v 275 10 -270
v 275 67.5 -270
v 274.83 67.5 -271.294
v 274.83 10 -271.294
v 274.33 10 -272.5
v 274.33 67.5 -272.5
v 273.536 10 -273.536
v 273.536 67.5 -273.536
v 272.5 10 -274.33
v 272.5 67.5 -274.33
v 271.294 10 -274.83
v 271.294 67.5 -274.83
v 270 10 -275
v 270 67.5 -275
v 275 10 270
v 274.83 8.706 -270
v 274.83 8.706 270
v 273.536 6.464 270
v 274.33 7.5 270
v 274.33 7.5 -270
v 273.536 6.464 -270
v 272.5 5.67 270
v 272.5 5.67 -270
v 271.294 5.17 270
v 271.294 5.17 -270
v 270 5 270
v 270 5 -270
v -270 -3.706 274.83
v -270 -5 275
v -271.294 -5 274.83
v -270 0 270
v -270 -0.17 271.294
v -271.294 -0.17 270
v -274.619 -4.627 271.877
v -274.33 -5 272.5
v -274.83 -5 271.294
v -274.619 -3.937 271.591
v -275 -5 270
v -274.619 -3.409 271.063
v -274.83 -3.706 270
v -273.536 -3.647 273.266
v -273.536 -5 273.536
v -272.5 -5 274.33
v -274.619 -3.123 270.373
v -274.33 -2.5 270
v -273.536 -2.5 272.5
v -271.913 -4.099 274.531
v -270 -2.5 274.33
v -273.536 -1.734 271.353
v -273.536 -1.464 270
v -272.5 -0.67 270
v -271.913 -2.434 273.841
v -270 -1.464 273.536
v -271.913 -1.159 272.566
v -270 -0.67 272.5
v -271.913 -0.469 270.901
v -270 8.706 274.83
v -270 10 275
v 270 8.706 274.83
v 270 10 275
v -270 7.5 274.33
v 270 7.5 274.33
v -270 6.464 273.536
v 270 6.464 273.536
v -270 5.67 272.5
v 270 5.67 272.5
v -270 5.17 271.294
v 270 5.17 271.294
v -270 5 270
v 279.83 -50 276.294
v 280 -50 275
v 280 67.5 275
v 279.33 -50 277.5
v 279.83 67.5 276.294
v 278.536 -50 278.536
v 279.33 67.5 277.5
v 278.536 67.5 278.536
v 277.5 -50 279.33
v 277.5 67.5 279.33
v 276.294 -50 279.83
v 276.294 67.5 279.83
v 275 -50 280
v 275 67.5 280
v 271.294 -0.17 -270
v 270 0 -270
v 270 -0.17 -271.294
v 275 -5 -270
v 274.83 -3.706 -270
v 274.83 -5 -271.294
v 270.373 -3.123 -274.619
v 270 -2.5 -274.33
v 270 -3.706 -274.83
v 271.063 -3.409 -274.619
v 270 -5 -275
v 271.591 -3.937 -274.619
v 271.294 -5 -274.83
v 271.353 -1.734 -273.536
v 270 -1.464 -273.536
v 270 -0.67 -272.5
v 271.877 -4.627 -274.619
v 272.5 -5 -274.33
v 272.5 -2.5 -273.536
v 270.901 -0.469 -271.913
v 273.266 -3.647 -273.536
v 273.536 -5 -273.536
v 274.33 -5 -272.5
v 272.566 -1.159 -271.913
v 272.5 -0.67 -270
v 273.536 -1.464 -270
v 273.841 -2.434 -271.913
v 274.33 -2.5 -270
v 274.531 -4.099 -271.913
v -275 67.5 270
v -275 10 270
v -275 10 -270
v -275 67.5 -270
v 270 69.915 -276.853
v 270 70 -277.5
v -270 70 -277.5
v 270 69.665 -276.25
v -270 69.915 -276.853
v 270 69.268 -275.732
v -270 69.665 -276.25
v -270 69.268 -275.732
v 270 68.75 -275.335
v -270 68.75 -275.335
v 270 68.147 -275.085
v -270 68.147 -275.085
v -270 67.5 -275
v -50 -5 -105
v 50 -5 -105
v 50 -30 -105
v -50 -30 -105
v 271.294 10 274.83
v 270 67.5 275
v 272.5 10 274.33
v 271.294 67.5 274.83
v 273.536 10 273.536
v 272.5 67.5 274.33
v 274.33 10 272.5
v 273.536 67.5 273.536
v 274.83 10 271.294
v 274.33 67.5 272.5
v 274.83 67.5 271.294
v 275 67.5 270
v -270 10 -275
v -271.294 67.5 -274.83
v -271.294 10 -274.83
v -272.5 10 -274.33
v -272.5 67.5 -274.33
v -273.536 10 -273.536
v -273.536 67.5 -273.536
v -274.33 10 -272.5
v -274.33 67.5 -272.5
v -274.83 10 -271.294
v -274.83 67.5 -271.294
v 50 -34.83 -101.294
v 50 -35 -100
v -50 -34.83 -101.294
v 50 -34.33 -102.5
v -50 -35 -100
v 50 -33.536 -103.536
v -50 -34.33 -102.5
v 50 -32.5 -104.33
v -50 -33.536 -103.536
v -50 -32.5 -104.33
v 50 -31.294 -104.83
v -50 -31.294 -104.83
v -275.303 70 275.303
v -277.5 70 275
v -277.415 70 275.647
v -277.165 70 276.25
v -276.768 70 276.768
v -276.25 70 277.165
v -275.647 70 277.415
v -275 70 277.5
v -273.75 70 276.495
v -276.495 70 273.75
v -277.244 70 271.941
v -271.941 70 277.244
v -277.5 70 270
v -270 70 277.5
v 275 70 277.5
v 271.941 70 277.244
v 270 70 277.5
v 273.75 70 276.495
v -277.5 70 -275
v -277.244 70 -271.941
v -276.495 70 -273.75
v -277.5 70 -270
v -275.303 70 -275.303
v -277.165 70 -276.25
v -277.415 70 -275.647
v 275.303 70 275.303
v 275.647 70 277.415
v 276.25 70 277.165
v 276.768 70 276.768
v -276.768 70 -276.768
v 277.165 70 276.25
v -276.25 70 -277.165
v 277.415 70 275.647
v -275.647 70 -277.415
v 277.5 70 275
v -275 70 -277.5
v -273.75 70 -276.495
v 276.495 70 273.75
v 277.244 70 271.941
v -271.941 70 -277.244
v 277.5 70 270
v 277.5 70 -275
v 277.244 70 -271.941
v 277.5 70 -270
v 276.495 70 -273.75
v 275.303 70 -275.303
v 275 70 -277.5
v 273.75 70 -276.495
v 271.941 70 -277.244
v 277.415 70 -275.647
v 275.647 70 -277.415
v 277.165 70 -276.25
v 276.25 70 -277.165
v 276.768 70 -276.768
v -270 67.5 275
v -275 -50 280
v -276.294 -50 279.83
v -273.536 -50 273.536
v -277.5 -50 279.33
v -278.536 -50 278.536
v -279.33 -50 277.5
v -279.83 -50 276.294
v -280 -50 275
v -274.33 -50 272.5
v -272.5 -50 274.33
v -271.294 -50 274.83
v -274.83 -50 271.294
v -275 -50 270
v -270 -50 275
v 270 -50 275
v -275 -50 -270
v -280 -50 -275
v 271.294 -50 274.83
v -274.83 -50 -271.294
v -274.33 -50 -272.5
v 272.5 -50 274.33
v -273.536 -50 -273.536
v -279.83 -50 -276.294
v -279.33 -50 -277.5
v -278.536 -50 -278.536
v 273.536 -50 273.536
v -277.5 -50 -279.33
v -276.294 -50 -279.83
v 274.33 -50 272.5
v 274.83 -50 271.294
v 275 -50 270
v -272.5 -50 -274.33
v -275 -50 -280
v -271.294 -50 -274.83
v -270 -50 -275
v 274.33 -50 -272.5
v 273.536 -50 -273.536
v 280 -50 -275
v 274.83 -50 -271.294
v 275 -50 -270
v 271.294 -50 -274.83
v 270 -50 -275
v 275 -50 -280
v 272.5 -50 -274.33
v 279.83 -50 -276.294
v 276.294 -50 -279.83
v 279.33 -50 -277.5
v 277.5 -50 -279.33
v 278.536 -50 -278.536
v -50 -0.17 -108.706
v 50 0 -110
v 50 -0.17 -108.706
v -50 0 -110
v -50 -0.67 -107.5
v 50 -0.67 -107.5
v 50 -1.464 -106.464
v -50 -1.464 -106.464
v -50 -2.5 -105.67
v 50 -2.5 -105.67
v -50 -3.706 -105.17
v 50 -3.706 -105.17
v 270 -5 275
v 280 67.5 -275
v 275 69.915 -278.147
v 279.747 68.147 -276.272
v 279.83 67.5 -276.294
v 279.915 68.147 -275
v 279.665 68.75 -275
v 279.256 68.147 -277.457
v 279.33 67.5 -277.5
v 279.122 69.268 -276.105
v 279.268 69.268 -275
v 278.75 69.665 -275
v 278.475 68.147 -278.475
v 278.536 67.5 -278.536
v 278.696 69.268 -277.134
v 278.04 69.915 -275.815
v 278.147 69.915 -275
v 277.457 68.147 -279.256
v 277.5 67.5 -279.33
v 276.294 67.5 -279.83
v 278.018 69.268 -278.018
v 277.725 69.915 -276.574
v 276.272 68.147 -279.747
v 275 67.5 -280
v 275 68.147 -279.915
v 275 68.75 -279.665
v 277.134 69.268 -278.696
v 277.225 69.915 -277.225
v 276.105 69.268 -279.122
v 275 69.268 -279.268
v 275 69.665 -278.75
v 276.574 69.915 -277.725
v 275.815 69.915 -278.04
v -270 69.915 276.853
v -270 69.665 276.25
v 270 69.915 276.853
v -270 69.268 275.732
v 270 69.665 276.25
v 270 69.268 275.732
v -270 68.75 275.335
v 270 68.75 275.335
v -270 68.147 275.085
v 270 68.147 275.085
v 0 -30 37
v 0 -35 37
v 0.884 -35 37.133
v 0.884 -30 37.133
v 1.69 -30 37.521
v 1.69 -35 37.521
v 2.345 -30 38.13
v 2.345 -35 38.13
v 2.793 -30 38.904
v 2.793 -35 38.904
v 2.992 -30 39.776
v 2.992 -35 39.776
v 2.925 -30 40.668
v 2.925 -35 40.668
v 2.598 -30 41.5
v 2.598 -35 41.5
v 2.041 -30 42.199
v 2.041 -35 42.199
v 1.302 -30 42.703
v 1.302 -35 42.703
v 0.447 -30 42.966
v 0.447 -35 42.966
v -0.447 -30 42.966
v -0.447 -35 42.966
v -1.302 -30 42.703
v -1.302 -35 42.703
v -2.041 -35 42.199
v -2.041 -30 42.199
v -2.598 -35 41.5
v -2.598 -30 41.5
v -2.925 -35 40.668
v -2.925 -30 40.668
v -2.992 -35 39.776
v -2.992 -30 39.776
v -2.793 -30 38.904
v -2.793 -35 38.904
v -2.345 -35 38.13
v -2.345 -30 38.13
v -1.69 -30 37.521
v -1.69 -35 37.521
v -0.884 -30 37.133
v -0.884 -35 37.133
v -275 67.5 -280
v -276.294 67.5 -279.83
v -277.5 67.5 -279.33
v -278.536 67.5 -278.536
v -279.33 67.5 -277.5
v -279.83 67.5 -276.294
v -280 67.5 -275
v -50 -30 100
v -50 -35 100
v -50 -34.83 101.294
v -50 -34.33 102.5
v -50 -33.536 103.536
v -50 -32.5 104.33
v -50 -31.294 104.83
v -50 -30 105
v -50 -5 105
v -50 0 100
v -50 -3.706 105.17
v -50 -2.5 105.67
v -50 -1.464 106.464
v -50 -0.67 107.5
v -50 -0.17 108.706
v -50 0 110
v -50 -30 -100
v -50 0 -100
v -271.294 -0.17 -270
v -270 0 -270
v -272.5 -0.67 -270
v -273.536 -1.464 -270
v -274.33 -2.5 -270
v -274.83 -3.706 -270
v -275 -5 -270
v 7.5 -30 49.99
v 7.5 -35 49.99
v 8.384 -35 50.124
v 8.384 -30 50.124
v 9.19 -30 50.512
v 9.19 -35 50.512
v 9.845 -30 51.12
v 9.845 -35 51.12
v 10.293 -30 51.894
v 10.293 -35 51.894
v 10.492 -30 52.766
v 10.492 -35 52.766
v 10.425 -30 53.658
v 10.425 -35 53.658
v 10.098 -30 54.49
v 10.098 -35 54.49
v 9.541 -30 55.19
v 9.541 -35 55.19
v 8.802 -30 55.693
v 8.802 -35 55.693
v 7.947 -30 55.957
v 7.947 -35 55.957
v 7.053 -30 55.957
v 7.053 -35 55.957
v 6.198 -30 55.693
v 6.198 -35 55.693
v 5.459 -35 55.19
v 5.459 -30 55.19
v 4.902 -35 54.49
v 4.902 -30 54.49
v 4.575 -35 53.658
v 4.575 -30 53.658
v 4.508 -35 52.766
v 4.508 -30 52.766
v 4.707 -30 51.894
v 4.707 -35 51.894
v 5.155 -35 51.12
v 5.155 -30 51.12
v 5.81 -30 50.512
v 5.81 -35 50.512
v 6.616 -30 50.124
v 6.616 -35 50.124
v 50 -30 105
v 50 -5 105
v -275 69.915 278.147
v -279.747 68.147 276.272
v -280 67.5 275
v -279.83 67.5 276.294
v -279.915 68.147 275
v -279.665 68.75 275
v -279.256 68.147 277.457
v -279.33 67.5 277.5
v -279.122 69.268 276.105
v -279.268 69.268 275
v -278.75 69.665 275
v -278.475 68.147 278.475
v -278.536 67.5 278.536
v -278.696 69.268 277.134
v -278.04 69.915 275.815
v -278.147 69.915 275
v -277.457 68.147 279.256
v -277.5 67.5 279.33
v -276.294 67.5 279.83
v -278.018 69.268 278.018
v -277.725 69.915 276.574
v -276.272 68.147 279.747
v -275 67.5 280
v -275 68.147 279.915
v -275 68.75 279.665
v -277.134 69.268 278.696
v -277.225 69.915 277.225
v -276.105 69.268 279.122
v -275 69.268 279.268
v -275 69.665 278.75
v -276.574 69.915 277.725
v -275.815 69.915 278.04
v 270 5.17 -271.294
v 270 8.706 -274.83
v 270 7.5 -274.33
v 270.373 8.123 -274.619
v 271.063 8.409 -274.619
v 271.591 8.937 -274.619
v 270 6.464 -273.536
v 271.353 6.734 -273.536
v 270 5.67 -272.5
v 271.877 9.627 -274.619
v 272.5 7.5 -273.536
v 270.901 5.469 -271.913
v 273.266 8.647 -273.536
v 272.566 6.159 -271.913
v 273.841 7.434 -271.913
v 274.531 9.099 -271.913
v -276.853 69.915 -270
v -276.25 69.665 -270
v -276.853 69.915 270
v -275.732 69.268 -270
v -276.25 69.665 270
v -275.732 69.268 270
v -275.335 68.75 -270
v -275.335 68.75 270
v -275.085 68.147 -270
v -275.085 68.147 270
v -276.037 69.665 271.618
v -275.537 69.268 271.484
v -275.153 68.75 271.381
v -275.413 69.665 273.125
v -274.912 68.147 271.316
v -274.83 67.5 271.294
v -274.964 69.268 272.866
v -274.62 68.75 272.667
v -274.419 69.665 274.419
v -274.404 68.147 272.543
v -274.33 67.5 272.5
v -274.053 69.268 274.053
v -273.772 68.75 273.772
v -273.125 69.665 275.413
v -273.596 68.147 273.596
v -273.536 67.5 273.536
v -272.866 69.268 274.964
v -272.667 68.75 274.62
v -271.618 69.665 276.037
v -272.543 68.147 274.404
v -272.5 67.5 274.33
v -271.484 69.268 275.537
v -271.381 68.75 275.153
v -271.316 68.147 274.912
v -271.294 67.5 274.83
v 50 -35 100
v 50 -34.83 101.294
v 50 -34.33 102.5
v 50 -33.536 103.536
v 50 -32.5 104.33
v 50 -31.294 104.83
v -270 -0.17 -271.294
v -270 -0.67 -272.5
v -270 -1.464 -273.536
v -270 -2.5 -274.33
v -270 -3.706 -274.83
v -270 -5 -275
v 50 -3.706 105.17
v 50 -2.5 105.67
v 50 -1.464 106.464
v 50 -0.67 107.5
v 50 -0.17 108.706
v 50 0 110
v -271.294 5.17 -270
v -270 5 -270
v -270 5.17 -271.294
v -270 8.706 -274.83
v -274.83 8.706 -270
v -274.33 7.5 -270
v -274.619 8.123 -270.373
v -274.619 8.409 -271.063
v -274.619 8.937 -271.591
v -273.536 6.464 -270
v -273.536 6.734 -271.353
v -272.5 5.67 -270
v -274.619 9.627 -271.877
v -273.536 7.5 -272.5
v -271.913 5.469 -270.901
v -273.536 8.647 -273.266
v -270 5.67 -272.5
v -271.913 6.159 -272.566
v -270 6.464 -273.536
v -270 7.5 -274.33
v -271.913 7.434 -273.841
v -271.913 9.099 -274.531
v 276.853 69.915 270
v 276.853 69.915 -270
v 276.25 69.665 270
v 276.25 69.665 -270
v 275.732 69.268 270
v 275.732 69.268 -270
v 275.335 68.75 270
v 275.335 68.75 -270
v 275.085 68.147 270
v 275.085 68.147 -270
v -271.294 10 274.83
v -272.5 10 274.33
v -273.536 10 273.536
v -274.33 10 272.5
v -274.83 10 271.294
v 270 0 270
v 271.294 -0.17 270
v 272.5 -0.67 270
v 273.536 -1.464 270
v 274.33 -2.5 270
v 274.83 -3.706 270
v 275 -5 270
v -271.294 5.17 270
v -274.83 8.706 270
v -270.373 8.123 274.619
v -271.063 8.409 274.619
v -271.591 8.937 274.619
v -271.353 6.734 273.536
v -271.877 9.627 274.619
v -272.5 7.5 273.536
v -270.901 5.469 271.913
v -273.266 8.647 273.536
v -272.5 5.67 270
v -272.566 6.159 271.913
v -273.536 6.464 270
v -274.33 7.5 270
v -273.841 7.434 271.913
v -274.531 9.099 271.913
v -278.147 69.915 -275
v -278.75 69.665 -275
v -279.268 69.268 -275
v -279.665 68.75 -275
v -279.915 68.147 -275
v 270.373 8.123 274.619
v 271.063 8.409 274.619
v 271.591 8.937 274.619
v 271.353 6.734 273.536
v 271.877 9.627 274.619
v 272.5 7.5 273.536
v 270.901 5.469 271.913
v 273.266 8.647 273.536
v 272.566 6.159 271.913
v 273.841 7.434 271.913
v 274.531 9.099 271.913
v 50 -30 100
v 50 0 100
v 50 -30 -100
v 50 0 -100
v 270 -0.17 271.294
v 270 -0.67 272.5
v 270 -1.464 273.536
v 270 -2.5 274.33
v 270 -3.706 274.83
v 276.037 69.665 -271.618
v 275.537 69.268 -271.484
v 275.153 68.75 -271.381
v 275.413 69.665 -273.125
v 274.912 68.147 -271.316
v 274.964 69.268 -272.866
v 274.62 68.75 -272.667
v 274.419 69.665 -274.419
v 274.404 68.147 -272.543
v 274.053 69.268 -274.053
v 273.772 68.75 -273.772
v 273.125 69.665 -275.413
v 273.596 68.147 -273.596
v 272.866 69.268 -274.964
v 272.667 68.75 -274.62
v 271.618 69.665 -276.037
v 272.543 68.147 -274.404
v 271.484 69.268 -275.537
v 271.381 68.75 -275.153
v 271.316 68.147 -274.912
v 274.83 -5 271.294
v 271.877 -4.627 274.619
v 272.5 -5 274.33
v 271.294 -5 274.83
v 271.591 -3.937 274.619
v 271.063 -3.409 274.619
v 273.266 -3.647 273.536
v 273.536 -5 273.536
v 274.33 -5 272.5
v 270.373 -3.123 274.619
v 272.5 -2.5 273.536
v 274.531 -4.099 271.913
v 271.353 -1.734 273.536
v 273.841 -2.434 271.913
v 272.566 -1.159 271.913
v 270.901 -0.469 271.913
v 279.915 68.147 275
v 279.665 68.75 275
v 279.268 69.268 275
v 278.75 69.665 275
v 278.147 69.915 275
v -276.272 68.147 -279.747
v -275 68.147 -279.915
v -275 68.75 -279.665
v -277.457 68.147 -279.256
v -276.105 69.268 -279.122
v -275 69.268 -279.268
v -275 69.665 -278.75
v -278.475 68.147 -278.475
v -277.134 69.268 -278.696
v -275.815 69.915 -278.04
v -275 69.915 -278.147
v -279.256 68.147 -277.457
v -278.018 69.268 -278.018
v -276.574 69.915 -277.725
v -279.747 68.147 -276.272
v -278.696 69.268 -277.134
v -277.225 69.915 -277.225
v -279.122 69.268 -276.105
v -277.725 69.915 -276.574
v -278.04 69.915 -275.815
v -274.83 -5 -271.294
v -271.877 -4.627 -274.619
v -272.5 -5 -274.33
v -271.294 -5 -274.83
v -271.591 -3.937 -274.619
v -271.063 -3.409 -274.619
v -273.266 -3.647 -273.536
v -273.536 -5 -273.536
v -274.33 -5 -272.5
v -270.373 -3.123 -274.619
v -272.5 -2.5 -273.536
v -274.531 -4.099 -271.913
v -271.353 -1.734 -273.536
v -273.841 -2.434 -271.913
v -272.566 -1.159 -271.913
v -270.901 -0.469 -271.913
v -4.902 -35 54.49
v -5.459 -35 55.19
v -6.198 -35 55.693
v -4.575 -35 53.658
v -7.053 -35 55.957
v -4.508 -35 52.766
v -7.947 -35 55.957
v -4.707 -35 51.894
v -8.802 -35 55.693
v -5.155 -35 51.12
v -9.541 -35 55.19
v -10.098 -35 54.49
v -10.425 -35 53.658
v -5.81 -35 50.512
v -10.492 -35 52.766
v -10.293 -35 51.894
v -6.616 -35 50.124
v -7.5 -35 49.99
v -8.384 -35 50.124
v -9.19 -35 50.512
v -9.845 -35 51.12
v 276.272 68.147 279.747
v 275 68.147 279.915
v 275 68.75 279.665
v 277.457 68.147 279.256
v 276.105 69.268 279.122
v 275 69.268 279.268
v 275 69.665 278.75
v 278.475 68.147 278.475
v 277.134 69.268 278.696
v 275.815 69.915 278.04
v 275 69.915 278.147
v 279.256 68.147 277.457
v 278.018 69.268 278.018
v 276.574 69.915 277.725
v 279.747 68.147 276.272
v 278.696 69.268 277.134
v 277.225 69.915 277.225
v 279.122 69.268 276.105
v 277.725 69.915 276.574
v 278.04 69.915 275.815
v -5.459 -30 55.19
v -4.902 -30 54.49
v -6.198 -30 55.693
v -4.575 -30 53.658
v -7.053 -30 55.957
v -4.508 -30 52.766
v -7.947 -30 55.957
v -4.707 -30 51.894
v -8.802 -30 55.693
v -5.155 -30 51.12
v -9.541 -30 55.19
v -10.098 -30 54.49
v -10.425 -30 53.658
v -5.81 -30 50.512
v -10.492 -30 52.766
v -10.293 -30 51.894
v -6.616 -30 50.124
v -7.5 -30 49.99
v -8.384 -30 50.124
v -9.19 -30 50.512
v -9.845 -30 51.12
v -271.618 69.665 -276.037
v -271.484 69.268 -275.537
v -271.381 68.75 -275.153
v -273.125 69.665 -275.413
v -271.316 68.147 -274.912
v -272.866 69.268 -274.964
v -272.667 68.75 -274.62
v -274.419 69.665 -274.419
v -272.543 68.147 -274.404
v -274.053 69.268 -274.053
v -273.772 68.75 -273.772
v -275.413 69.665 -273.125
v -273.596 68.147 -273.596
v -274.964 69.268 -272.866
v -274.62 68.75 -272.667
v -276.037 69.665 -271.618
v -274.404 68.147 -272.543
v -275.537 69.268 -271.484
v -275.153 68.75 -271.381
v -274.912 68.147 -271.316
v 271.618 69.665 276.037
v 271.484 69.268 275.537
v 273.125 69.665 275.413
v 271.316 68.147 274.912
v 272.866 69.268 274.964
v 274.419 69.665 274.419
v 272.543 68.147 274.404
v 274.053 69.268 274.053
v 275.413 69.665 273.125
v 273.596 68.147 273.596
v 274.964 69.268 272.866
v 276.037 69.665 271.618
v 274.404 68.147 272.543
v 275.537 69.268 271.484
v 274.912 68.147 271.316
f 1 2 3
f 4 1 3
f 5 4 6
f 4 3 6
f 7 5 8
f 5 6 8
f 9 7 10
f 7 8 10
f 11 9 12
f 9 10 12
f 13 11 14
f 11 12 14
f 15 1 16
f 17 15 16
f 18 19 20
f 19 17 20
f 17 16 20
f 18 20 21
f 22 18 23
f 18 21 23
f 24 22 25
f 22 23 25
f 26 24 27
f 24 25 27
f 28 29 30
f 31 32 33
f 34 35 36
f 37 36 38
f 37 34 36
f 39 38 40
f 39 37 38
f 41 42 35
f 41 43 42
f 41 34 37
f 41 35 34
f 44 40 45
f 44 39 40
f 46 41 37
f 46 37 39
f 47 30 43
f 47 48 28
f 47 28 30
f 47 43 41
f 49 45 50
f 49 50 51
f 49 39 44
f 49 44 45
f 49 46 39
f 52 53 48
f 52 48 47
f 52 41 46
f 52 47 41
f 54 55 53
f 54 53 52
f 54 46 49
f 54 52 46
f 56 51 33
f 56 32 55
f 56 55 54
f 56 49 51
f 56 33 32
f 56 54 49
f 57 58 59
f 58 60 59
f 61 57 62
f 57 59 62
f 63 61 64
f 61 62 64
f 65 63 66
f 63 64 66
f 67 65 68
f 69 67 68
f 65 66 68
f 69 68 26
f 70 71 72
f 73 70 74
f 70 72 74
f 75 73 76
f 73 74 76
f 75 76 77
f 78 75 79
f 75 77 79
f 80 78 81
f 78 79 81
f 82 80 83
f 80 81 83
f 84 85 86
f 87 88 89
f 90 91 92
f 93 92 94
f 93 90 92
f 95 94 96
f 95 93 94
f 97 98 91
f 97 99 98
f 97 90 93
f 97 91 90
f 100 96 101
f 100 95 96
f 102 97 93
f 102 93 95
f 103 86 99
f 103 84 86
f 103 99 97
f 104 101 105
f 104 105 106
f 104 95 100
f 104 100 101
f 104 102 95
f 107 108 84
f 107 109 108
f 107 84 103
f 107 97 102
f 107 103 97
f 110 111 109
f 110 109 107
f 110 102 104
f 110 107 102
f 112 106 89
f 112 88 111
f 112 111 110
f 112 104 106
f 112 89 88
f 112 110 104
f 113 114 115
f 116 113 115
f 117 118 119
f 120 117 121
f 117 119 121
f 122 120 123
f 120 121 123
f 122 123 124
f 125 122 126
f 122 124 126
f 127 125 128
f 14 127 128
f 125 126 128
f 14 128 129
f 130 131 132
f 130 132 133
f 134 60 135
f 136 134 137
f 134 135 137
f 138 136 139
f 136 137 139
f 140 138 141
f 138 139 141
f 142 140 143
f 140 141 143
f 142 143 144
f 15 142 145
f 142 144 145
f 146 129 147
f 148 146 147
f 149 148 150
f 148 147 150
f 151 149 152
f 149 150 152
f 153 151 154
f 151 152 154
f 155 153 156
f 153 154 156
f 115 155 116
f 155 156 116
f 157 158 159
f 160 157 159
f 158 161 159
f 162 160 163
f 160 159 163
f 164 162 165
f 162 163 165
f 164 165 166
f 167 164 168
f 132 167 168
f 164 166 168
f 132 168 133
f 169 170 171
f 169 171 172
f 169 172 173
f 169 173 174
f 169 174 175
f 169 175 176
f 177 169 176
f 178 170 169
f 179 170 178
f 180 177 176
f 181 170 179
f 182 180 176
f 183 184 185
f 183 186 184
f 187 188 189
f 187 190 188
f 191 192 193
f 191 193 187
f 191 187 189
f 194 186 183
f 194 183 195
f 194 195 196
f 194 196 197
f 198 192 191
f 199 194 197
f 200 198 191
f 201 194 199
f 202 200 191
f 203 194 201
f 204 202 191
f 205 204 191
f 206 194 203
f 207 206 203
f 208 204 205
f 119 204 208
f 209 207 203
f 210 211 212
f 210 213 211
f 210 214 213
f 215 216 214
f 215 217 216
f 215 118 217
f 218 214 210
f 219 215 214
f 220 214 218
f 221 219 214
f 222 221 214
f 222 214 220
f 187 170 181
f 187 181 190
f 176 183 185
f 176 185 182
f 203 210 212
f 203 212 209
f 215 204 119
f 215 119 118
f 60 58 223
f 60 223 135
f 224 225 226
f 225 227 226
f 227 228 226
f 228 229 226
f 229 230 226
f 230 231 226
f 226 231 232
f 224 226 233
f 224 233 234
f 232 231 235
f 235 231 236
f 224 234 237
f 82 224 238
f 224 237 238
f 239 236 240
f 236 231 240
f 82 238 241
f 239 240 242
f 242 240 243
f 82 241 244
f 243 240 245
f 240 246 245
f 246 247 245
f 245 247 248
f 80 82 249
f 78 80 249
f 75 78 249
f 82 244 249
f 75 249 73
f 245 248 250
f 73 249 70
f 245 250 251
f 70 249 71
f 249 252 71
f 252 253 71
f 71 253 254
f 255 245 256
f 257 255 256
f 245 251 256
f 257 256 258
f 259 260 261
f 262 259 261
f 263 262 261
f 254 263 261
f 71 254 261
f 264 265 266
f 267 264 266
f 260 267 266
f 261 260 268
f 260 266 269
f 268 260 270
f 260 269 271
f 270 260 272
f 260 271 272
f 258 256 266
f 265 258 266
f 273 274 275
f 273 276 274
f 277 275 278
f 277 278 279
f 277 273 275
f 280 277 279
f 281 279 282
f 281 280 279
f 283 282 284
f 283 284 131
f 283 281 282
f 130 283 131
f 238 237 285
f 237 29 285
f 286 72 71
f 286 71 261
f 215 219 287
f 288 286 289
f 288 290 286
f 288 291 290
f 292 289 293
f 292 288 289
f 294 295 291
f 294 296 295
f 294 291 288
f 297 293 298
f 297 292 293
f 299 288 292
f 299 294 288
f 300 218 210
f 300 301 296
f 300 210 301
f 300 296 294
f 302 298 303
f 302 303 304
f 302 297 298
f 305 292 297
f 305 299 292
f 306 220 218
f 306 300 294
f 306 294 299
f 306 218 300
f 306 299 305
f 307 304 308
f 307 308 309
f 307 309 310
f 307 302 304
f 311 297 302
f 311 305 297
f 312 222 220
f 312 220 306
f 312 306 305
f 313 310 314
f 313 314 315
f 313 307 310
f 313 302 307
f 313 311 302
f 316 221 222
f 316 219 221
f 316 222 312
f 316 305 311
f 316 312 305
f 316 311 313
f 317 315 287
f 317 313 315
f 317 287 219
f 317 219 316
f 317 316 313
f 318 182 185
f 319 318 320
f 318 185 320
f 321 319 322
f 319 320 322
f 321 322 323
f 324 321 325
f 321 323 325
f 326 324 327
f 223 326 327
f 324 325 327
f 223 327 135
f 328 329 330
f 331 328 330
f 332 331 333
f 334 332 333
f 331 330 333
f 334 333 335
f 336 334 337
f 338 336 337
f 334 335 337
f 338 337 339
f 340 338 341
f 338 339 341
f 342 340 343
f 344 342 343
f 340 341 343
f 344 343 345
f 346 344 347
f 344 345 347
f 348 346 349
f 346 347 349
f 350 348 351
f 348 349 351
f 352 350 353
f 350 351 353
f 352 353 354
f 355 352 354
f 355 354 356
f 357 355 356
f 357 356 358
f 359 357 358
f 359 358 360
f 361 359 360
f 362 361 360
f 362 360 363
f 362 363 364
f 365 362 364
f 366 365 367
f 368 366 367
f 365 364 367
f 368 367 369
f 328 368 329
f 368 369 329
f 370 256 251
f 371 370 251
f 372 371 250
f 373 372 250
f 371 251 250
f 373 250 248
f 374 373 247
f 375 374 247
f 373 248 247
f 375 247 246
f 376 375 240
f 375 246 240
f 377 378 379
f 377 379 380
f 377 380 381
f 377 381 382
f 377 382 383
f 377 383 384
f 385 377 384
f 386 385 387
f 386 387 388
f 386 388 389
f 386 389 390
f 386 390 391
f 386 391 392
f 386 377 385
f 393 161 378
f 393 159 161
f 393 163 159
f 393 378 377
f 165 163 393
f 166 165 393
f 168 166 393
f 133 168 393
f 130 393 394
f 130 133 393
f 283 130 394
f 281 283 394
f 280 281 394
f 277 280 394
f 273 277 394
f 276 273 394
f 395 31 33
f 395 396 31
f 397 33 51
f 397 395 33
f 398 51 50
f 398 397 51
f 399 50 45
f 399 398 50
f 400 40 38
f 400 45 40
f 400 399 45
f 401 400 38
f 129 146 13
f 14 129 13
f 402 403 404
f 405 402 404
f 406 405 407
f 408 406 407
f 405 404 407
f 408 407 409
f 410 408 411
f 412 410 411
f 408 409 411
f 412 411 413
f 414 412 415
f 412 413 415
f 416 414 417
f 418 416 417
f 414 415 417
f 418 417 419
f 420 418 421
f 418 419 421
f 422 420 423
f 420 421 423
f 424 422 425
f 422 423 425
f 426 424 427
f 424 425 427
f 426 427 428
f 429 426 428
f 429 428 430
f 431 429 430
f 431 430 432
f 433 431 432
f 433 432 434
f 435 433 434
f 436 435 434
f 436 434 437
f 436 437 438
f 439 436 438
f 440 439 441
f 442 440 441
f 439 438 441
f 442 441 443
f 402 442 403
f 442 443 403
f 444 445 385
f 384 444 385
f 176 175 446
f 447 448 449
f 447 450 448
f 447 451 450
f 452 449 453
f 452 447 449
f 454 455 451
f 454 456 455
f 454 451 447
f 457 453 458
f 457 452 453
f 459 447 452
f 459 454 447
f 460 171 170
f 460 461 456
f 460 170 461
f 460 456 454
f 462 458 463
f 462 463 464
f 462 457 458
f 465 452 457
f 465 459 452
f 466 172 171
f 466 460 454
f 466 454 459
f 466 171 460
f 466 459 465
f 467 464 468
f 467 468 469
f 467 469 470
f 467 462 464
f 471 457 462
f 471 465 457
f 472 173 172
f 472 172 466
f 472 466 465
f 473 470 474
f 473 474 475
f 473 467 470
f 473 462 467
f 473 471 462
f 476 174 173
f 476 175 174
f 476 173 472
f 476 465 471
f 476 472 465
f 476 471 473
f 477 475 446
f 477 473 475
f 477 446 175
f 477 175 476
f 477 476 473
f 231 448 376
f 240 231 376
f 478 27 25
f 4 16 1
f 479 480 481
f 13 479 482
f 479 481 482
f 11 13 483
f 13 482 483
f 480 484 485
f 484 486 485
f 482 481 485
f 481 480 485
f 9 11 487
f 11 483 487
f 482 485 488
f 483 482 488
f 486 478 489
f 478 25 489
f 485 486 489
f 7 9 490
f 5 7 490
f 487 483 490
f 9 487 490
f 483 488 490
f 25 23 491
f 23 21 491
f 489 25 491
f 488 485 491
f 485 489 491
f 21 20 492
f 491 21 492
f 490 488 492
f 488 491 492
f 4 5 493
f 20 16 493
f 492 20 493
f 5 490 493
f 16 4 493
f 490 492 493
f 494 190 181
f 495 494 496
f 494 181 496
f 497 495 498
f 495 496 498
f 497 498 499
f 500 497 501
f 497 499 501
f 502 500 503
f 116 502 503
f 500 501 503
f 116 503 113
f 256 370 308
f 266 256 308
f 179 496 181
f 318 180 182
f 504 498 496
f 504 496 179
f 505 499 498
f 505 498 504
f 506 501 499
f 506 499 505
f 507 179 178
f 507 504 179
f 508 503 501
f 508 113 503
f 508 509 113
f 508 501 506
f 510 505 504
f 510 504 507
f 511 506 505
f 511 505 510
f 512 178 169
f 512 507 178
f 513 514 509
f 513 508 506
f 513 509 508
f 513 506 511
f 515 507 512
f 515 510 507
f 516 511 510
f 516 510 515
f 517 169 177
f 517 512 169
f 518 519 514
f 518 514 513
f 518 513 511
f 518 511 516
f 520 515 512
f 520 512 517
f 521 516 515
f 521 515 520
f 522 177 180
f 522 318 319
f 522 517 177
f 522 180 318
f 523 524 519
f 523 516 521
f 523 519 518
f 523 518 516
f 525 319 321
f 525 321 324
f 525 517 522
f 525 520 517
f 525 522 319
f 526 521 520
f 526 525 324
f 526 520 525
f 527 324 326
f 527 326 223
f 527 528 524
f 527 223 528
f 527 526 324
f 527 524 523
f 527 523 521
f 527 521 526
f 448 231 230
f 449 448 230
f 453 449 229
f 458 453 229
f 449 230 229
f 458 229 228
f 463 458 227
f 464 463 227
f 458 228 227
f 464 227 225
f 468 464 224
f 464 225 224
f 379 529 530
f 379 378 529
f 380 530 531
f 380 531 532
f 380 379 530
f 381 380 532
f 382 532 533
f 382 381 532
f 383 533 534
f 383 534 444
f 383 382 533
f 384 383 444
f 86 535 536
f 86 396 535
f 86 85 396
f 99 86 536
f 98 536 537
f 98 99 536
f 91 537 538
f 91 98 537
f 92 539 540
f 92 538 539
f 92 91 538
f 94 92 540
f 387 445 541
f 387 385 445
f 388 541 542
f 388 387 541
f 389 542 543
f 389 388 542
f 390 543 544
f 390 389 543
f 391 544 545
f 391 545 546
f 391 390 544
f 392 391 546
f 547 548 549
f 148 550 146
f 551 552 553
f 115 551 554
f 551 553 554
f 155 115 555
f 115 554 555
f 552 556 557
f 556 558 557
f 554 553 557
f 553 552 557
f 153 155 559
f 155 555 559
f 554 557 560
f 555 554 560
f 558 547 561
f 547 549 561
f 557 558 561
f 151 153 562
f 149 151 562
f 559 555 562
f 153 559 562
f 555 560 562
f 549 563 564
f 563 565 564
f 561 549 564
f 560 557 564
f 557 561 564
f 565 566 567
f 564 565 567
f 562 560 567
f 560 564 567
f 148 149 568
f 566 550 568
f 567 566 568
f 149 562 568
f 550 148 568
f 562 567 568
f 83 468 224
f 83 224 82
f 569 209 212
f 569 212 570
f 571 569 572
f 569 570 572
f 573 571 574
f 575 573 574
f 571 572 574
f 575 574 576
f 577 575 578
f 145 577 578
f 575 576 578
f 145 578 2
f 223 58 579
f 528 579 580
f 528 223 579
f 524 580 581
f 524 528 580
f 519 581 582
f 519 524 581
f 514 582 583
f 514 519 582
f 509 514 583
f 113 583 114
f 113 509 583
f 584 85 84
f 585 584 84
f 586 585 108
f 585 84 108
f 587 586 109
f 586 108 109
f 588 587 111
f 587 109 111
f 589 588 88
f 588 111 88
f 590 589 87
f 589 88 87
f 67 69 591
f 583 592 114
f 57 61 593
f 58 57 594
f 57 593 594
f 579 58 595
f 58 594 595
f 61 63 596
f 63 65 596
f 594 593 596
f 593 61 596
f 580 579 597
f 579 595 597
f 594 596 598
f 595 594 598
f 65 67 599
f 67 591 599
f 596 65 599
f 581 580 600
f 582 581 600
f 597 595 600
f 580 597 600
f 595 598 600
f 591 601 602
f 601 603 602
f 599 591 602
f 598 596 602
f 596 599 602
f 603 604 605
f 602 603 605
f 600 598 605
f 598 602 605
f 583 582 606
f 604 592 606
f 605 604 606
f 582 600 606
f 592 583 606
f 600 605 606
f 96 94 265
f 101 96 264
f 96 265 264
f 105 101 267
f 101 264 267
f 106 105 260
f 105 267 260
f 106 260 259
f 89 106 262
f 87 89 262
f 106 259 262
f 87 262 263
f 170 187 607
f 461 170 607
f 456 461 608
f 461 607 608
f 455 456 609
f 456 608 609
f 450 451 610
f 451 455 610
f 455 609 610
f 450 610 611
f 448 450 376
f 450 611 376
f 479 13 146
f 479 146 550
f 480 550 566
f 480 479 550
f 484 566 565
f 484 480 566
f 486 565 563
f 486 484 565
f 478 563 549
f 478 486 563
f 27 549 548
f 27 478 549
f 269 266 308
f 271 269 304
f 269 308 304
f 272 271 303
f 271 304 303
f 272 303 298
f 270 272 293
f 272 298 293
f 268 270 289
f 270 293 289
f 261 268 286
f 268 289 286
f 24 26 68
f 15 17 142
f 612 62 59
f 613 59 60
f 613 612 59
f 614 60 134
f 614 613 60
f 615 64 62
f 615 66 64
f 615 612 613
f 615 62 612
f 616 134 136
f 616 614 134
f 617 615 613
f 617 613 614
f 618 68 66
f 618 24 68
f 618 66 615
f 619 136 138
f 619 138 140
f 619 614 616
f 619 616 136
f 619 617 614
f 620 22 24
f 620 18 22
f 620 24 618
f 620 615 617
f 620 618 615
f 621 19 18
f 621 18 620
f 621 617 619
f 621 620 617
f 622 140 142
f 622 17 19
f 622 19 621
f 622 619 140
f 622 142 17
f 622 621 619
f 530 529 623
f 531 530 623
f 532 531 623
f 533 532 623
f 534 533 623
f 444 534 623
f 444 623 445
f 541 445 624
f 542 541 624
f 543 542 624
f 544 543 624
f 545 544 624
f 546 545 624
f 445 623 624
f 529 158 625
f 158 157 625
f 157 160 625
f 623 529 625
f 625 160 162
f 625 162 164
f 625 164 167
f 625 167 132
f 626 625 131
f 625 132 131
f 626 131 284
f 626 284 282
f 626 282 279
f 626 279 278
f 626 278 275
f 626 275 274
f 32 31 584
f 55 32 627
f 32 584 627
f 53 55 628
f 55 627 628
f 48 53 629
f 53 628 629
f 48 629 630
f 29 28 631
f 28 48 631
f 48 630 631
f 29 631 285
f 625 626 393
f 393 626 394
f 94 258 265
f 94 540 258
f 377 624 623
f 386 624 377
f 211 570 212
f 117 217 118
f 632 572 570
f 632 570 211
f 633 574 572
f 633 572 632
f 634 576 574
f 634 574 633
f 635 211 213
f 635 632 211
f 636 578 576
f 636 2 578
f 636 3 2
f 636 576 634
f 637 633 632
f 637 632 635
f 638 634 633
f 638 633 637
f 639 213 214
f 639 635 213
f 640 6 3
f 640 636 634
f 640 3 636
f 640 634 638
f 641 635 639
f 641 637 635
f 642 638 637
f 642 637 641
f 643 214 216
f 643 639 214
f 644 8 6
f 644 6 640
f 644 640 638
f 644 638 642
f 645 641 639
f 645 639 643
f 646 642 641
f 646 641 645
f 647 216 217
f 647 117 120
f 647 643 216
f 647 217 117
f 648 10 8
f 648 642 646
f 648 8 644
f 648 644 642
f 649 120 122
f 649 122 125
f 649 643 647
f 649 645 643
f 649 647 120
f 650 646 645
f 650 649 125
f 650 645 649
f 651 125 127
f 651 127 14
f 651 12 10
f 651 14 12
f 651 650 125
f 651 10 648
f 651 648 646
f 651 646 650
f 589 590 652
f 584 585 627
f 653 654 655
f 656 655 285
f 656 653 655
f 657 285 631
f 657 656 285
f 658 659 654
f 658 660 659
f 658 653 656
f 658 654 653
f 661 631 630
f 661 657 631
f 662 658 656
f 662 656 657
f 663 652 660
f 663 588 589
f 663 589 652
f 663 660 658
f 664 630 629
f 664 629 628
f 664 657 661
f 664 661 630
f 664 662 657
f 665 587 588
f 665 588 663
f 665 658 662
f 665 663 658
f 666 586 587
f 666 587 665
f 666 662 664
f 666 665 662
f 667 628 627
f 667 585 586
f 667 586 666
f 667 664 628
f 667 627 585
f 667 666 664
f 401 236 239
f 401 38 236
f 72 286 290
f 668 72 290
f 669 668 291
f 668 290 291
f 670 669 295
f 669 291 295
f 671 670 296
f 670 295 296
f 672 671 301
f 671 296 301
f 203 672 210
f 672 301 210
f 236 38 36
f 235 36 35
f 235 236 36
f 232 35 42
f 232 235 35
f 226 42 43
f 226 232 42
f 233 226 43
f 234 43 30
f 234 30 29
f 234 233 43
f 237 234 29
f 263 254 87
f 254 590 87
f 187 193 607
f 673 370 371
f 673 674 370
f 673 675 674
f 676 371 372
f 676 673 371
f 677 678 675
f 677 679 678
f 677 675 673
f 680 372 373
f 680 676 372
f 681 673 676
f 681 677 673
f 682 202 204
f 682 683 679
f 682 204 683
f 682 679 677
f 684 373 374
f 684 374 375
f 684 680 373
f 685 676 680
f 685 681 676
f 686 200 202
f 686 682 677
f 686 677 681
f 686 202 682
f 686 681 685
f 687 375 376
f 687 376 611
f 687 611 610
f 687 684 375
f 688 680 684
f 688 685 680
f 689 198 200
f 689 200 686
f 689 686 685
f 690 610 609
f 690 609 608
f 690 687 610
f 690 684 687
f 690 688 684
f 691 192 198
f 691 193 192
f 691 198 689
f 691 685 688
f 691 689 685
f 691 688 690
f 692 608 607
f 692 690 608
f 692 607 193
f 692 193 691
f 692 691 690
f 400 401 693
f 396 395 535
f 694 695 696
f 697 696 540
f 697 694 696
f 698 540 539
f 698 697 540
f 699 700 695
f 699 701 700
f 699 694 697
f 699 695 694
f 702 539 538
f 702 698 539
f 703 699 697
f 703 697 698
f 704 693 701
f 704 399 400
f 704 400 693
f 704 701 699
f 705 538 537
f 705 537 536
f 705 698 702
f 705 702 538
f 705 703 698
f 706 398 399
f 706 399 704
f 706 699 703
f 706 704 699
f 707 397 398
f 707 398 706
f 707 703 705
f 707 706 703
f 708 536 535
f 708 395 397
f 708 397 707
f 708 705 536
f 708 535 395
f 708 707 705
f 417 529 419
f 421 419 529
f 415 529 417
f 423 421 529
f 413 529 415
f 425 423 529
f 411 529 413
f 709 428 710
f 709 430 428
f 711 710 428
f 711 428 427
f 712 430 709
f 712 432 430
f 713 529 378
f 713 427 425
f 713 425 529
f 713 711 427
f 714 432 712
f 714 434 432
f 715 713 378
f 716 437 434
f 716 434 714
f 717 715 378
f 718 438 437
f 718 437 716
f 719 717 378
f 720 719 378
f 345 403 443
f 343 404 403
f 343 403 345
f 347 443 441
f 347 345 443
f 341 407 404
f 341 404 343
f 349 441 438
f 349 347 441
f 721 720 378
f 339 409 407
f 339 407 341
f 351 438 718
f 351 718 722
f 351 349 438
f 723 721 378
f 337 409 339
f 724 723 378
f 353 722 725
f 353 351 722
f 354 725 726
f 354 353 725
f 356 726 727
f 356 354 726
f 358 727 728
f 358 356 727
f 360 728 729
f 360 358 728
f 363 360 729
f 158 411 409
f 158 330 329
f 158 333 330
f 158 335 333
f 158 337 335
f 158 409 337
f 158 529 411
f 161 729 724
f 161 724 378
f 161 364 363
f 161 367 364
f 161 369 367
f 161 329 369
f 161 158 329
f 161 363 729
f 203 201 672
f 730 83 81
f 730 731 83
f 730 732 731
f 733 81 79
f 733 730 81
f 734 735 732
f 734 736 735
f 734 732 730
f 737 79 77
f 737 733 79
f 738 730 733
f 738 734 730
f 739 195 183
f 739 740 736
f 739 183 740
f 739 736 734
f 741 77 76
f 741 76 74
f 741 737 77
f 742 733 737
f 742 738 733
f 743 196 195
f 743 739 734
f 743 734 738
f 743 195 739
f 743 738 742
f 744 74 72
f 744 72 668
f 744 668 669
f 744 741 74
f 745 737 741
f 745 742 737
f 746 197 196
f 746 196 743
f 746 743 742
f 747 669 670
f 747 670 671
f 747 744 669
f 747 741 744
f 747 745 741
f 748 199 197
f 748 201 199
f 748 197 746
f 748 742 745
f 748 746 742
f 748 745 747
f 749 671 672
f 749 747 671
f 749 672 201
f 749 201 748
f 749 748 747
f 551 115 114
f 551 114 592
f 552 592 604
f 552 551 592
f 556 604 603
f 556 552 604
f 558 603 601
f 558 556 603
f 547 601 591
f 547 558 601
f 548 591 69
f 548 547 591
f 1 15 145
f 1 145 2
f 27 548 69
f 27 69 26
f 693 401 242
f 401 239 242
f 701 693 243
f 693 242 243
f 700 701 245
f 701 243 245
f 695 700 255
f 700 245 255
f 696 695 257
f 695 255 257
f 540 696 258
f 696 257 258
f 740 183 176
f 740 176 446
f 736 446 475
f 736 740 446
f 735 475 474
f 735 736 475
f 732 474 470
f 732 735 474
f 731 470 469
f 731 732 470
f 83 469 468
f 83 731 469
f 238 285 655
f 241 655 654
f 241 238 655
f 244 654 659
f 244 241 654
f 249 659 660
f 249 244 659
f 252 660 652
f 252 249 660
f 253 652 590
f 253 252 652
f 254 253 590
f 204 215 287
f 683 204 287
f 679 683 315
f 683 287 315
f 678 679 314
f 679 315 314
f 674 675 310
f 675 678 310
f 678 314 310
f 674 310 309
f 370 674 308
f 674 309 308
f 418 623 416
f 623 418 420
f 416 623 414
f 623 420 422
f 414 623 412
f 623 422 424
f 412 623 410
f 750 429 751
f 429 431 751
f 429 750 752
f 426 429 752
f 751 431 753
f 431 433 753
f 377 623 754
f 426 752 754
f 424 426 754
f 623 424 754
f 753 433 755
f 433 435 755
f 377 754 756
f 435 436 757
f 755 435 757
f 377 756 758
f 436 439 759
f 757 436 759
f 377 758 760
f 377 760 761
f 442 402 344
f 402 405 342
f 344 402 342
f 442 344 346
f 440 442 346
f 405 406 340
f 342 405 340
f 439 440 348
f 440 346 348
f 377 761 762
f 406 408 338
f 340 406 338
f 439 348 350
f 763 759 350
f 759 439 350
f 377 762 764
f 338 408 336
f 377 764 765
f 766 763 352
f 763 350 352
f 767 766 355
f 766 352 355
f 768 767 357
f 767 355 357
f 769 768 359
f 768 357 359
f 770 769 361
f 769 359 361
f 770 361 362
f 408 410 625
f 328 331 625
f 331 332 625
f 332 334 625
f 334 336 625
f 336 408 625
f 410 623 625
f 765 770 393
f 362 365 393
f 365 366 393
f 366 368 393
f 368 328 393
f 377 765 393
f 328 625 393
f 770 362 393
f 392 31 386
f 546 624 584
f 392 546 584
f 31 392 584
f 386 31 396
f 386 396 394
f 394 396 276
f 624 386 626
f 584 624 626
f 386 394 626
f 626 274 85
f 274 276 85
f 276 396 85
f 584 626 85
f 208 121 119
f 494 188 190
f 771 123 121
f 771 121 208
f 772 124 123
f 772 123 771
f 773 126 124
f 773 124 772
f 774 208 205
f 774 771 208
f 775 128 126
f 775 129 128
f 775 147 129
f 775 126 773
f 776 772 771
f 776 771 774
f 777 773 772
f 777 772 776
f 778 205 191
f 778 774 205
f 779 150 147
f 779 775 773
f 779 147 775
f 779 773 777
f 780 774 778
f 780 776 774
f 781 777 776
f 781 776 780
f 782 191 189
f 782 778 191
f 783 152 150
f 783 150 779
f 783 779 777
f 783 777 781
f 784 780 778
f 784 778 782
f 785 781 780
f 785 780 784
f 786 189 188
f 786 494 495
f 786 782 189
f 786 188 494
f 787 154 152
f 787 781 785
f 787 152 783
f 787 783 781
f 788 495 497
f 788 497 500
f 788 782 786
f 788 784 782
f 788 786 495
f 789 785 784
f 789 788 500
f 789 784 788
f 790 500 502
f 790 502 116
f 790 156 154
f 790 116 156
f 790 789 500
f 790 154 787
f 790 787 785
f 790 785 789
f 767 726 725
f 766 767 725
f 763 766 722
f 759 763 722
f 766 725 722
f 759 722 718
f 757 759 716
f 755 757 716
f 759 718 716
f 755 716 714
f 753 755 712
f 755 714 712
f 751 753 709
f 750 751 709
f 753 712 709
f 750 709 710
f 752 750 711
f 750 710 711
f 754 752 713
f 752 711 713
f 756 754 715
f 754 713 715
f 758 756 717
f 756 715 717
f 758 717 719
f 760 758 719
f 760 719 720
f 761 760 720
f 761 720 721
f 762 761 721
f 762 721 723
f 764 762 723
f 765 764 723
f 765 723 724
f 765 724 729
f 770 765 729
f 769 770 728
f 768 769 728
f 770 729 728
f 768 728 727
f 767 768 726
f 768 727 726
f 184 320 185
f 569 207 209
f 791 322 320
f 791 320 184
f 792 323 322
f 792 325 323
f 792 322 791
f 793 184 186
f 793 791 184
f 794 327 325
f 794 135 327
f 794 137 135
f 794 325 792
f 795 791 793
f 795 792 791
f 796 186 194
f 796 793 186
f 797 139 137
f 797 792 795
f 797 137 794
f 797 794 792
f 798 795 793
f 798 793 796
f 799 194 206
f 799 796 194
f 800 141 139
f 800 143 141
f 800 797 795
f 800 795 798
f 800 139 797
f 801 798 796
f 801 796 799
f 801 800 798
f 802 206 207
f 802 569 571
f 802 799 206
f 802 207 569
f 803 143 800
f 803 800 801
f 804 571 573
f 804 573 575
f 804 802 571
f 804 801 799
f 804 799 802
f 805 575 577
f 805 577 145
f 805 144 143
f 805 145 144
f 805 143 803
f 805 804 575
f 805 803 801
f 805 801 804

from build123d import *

# Parameters (mm, degrees)
SKETCH1_W           = 560
SKETCH1_H           = 560
BOSS_EXTRUDE1_DEPTH = 5
SKETCH2_W           = 560
SKETCH2_H           = 560
SKETCH2_W_2         = 550
SKETCH2_H_2         = 550
BOSS_EXTRUDE2_DEPTH = 65
BOSS_EXTRUDE3_START = -5
SKETCH2_2_W         = 560
SKETCH2_2_H         = 560
SKETCH2_2_W_2       = 550
SKETCH2_2_H_2       = 550
BOSS_EXTRUDE3_DEPTH = 50
SKETCH7_W           = 100
SKETCH7_H           = 200
BOSS_EXTRUDE5_DEPTH = 5
SKETCH8_W           = 100
SKETCH8_H           = 35
BOSS_EXTRUDE6_DEPTH = 5
SKETCH9_R           = 3
CUT_EXTRUDE1_DEPTH  = 5
FILLET1_R           = 5
FILLET2_R           = 2.5
FILLET3_R           = 5


# Some blends are built 0.0001 mm under size
with BuildPart() as part:
    # Sketch1 → Boss-Extrude1 (new body)
    with BuildSketch(Plane(origin=(0, 0, 0), x_dir=(1, 0, 0), z_dir=(0, 1, 0))):
        Rectangle(SKETCH1_W, SKETCH1_H)
    extrude(amount=BOSS_EXTRUDE1_DEPTH)

    # Sketch2 → Boss-Extrude2 (add)
    with BuildSketch(Plane(origin=(0, 5, 0), x_dir=(1, 0, 0), z_dir=(0, 1, 0))):
        Rectangle(SKETCH2_W, SKETCH2_H)
        Rectangle(SKETCH2_W_2, SKETCH2_H_2, mode=Mode.SUBTRACT)
    extrude(amount=BOSS_EXTRUDE2_DEPTH)

    # Sketch2<2> → Boss-Extrude3 (add)
    with BuildSketch(Plane(origin=(0, 5, 0), x_dir=(1, 0, 0), z_dir=(0, 1, 0)).offset(BOSS_EXTRUDE3_START)):
        Rectangle(SKETCH2_2_W, SKETCH2_2_H)
        Rectangle(SKETCH2_2_W_2, SKETCH2_2_H_2, mode=Mode.SUBTRACT)
    extrude(amount=-BOSS_EXTRUDE3_DEPTH)



with BuildPart() as body_2:
    # Sketch7 → Boss-Extrude5 (new body)
    with BuildSketch(Plane(origin=(0, -30, 0), x_dir=(-1, 0, 0), z_dir=(0, -1, 0))):
        Rectangle(SKETCH7_W, SKETCH7_H)
    extrude(amount=BOSS_EXTRUDE5_DEPTH)


with BuildPart() as part_1:
    add(part.part)

    add(body_2.part)  # Boss-Extrude6 merges body 2
    # Sketch8 → Boss-Extrude6 (add)
    with BuildSketch(Plane(origin=(0, 0, -100), x_dir=(-1, 0, 0), z_dir=(0, 0, -1))):
        with Locations((0, -17.5)):
            Rectangle(SKETCH8_W, SKETCH8_H)
    boss_extrude6 = extrude(amount=BOSS_EXTRUDE6_DEPTH)

    # Mirror1: Boss-Extrude6 across plane
    add(boss_extrude6.mirror(Plane(origin=(0, 0, 0), x_dir=(1, 0, 0), z_dir=(0, 0, -1))))

    # Sketch9 → Cut-Extrude1 (cut)
    with BuildSketch(Plane.XZ.offset(35)):
        with Locations(Location((7.5, 52.990381057, 0), (0, 0, 270))):
            Circle(SKETCH9_R)
        with Locations(Location((0, 40, 0), (0, 0, 270))):
            Circle(SKETCH9_R)
        with Locations(Location((-7.5, 52.990381057, 0), (0, 0, 270))):
            Circle(SKETCH9_R)
    extrude(amount=-CUT_EXTRUDE1_DEPTH, mode=Mode.SUBTRACT)

    # Fillet1
    fillet1_edges = [part_1.edges().sort_by_distance(p)[0] for p in [
        (275, 5, 0),
        (0, 5, -275),
        (-275, 5, 0),
        (0, 5, 275),
        (275, 37.5, -275),
        (-275, 37.5, -275),
        (-275, 37.5, 275),
        (275, 37.5, 275),
        (275, 0, 0),
        (275, -25, 275),
        (0, 0, 275),
        (-275, -25, 275),
        (-275, 0, 0),
        (-275, -25, -275),
        (0, 0, -275),
        (275, -25, -275),
        (0, -35, -105),
        (0, 0, -105),
        (0, 0, 105),
        (0, -35, 105),
    ]]
    fillet(fillet1_edges, radius=FILLET1_R)

    # Fillet2
    fillet2_edges = [part_1.edges().sort_by_distance(p)[0] for p in [
        (275, 70, 0),
        (0, 70, -275),
        (0, 70, 275),
        (-275, 70, 0),
        (273.535533906, 70, -273.535533906),
        (273.535533906, 70, 273.535533906),
        (-273.535533906, 70, 273.535533906),
        (-273.535533906, 70, -273.535533906),
        (0, 70, 280),
        (280, 70, 0),
        (0, 70, -280),
        (-280, 70, 0),
    ]]
    fillet(fillet2_edges, radius=FILLET2_R - 0.0001)  # a hair under: the kernel refuses the full size

    # Fillet3
    # the kernel refuses this fillet: 5 mm, written as the material it takes off along each edge
    with BuildSketch(Plane(origin=(275, 70, 275), x_dir=(0, 0, 1), z_dir=(-1, 0, 0))) as fillet3_piece_1:
        with BuildLine():
            CenterArc((2.5001, -2.4999), 2.4999, 0, 90)
            Line((5, -2.4999), (5, 0))
            Line((5, 0), (2.5001, 0))
        make_face()
    revolve(axis=Axis((275, 70, 275), (0, 1, 0)), revolution_arc=90, mode=Mode.SUBTRACT)
    with BuildSketch(Plane(origin=(-275, 70, 275), x_dir=(-1, 0, 0), z_dir=(0, 0, -1))) as fillet3_piece_2:
        with BuildLine():
            CenterArc((2.5001, -2.4999), 2.4999, 0, 90)
            Line((5, -2.4999), (5, 0))
            Line((5, 0), (2.5001, 0))
        make_face()
    revolve(axis=Axis((-275, 70, 275), (0, 1, 0)), revolution_arc=90, mode=Mode.SUBTRACT)
    with BuildSketch(Plane(origin=(-275, 70, -275), x_dir=(0, 0, -1), z_dir=(1, 0, 0))) as fillet3_piece_3:
        with BuildLine():
            CenterArc((2.5001, -2.4999), 2.4999, 0, 90)
            Line((5, -2.4999), (5, 0))
            Line((5, 0), (2.5001, 0))
        make_face()
    revolve(axis=Axis((-275, 70, -275), (0, 1, 0)), revolution_arc=90, mode=Mode.SUBTRACT)
    with BuildSketch(Plane(origin=(275, 70, -275), x_dir=(1, 0, 0), z_dir=(0, 0, 1))) as fillet3_piece_4:
        with BuildLine():
            CenterArc((2.5001, -2.4999), 2.4999, 0, 90)
            Line((5, -2.4999), (5, 0))
            Line((5, 0), (2.5001, 0))
        make_face()
    revolve(axis=Axis((275, 70, -275), (0, 1, 0)), revolution_arc=90, mode=Mode.SUBTRACT)
    with BuildSketch(Plane(origin=(-280, -62.5, -280), x_dir=(0, 0, 1), z_dir=(0, 1, 0)), Plane(origin=(-280, -62.5, 280), x_dir=(1, 0, 0), z_dir=(0, 1, 0)), Plane(origin=(280, 70, -280), x_dir=(0, 0, 1), z_dir=(0, -1, 0)), Plane(origin=(280, 70, 280), x_dir=(-1, 0, 0), z_dir=(0, -1, 0))) as fillet3_piece_5:
        with BuildLine():
            CenterArc((FILLET3_R, FILLET3_R), FILLET3_R, 180, 90)
            Line((0, FILLET3_R), (0, 0))
            Line((0, 0), (FILLET3_R, 0))
        make_face()
    extrude(amount=132.5, mode=Mode.SUBTRACT)


solid = part_1.part
